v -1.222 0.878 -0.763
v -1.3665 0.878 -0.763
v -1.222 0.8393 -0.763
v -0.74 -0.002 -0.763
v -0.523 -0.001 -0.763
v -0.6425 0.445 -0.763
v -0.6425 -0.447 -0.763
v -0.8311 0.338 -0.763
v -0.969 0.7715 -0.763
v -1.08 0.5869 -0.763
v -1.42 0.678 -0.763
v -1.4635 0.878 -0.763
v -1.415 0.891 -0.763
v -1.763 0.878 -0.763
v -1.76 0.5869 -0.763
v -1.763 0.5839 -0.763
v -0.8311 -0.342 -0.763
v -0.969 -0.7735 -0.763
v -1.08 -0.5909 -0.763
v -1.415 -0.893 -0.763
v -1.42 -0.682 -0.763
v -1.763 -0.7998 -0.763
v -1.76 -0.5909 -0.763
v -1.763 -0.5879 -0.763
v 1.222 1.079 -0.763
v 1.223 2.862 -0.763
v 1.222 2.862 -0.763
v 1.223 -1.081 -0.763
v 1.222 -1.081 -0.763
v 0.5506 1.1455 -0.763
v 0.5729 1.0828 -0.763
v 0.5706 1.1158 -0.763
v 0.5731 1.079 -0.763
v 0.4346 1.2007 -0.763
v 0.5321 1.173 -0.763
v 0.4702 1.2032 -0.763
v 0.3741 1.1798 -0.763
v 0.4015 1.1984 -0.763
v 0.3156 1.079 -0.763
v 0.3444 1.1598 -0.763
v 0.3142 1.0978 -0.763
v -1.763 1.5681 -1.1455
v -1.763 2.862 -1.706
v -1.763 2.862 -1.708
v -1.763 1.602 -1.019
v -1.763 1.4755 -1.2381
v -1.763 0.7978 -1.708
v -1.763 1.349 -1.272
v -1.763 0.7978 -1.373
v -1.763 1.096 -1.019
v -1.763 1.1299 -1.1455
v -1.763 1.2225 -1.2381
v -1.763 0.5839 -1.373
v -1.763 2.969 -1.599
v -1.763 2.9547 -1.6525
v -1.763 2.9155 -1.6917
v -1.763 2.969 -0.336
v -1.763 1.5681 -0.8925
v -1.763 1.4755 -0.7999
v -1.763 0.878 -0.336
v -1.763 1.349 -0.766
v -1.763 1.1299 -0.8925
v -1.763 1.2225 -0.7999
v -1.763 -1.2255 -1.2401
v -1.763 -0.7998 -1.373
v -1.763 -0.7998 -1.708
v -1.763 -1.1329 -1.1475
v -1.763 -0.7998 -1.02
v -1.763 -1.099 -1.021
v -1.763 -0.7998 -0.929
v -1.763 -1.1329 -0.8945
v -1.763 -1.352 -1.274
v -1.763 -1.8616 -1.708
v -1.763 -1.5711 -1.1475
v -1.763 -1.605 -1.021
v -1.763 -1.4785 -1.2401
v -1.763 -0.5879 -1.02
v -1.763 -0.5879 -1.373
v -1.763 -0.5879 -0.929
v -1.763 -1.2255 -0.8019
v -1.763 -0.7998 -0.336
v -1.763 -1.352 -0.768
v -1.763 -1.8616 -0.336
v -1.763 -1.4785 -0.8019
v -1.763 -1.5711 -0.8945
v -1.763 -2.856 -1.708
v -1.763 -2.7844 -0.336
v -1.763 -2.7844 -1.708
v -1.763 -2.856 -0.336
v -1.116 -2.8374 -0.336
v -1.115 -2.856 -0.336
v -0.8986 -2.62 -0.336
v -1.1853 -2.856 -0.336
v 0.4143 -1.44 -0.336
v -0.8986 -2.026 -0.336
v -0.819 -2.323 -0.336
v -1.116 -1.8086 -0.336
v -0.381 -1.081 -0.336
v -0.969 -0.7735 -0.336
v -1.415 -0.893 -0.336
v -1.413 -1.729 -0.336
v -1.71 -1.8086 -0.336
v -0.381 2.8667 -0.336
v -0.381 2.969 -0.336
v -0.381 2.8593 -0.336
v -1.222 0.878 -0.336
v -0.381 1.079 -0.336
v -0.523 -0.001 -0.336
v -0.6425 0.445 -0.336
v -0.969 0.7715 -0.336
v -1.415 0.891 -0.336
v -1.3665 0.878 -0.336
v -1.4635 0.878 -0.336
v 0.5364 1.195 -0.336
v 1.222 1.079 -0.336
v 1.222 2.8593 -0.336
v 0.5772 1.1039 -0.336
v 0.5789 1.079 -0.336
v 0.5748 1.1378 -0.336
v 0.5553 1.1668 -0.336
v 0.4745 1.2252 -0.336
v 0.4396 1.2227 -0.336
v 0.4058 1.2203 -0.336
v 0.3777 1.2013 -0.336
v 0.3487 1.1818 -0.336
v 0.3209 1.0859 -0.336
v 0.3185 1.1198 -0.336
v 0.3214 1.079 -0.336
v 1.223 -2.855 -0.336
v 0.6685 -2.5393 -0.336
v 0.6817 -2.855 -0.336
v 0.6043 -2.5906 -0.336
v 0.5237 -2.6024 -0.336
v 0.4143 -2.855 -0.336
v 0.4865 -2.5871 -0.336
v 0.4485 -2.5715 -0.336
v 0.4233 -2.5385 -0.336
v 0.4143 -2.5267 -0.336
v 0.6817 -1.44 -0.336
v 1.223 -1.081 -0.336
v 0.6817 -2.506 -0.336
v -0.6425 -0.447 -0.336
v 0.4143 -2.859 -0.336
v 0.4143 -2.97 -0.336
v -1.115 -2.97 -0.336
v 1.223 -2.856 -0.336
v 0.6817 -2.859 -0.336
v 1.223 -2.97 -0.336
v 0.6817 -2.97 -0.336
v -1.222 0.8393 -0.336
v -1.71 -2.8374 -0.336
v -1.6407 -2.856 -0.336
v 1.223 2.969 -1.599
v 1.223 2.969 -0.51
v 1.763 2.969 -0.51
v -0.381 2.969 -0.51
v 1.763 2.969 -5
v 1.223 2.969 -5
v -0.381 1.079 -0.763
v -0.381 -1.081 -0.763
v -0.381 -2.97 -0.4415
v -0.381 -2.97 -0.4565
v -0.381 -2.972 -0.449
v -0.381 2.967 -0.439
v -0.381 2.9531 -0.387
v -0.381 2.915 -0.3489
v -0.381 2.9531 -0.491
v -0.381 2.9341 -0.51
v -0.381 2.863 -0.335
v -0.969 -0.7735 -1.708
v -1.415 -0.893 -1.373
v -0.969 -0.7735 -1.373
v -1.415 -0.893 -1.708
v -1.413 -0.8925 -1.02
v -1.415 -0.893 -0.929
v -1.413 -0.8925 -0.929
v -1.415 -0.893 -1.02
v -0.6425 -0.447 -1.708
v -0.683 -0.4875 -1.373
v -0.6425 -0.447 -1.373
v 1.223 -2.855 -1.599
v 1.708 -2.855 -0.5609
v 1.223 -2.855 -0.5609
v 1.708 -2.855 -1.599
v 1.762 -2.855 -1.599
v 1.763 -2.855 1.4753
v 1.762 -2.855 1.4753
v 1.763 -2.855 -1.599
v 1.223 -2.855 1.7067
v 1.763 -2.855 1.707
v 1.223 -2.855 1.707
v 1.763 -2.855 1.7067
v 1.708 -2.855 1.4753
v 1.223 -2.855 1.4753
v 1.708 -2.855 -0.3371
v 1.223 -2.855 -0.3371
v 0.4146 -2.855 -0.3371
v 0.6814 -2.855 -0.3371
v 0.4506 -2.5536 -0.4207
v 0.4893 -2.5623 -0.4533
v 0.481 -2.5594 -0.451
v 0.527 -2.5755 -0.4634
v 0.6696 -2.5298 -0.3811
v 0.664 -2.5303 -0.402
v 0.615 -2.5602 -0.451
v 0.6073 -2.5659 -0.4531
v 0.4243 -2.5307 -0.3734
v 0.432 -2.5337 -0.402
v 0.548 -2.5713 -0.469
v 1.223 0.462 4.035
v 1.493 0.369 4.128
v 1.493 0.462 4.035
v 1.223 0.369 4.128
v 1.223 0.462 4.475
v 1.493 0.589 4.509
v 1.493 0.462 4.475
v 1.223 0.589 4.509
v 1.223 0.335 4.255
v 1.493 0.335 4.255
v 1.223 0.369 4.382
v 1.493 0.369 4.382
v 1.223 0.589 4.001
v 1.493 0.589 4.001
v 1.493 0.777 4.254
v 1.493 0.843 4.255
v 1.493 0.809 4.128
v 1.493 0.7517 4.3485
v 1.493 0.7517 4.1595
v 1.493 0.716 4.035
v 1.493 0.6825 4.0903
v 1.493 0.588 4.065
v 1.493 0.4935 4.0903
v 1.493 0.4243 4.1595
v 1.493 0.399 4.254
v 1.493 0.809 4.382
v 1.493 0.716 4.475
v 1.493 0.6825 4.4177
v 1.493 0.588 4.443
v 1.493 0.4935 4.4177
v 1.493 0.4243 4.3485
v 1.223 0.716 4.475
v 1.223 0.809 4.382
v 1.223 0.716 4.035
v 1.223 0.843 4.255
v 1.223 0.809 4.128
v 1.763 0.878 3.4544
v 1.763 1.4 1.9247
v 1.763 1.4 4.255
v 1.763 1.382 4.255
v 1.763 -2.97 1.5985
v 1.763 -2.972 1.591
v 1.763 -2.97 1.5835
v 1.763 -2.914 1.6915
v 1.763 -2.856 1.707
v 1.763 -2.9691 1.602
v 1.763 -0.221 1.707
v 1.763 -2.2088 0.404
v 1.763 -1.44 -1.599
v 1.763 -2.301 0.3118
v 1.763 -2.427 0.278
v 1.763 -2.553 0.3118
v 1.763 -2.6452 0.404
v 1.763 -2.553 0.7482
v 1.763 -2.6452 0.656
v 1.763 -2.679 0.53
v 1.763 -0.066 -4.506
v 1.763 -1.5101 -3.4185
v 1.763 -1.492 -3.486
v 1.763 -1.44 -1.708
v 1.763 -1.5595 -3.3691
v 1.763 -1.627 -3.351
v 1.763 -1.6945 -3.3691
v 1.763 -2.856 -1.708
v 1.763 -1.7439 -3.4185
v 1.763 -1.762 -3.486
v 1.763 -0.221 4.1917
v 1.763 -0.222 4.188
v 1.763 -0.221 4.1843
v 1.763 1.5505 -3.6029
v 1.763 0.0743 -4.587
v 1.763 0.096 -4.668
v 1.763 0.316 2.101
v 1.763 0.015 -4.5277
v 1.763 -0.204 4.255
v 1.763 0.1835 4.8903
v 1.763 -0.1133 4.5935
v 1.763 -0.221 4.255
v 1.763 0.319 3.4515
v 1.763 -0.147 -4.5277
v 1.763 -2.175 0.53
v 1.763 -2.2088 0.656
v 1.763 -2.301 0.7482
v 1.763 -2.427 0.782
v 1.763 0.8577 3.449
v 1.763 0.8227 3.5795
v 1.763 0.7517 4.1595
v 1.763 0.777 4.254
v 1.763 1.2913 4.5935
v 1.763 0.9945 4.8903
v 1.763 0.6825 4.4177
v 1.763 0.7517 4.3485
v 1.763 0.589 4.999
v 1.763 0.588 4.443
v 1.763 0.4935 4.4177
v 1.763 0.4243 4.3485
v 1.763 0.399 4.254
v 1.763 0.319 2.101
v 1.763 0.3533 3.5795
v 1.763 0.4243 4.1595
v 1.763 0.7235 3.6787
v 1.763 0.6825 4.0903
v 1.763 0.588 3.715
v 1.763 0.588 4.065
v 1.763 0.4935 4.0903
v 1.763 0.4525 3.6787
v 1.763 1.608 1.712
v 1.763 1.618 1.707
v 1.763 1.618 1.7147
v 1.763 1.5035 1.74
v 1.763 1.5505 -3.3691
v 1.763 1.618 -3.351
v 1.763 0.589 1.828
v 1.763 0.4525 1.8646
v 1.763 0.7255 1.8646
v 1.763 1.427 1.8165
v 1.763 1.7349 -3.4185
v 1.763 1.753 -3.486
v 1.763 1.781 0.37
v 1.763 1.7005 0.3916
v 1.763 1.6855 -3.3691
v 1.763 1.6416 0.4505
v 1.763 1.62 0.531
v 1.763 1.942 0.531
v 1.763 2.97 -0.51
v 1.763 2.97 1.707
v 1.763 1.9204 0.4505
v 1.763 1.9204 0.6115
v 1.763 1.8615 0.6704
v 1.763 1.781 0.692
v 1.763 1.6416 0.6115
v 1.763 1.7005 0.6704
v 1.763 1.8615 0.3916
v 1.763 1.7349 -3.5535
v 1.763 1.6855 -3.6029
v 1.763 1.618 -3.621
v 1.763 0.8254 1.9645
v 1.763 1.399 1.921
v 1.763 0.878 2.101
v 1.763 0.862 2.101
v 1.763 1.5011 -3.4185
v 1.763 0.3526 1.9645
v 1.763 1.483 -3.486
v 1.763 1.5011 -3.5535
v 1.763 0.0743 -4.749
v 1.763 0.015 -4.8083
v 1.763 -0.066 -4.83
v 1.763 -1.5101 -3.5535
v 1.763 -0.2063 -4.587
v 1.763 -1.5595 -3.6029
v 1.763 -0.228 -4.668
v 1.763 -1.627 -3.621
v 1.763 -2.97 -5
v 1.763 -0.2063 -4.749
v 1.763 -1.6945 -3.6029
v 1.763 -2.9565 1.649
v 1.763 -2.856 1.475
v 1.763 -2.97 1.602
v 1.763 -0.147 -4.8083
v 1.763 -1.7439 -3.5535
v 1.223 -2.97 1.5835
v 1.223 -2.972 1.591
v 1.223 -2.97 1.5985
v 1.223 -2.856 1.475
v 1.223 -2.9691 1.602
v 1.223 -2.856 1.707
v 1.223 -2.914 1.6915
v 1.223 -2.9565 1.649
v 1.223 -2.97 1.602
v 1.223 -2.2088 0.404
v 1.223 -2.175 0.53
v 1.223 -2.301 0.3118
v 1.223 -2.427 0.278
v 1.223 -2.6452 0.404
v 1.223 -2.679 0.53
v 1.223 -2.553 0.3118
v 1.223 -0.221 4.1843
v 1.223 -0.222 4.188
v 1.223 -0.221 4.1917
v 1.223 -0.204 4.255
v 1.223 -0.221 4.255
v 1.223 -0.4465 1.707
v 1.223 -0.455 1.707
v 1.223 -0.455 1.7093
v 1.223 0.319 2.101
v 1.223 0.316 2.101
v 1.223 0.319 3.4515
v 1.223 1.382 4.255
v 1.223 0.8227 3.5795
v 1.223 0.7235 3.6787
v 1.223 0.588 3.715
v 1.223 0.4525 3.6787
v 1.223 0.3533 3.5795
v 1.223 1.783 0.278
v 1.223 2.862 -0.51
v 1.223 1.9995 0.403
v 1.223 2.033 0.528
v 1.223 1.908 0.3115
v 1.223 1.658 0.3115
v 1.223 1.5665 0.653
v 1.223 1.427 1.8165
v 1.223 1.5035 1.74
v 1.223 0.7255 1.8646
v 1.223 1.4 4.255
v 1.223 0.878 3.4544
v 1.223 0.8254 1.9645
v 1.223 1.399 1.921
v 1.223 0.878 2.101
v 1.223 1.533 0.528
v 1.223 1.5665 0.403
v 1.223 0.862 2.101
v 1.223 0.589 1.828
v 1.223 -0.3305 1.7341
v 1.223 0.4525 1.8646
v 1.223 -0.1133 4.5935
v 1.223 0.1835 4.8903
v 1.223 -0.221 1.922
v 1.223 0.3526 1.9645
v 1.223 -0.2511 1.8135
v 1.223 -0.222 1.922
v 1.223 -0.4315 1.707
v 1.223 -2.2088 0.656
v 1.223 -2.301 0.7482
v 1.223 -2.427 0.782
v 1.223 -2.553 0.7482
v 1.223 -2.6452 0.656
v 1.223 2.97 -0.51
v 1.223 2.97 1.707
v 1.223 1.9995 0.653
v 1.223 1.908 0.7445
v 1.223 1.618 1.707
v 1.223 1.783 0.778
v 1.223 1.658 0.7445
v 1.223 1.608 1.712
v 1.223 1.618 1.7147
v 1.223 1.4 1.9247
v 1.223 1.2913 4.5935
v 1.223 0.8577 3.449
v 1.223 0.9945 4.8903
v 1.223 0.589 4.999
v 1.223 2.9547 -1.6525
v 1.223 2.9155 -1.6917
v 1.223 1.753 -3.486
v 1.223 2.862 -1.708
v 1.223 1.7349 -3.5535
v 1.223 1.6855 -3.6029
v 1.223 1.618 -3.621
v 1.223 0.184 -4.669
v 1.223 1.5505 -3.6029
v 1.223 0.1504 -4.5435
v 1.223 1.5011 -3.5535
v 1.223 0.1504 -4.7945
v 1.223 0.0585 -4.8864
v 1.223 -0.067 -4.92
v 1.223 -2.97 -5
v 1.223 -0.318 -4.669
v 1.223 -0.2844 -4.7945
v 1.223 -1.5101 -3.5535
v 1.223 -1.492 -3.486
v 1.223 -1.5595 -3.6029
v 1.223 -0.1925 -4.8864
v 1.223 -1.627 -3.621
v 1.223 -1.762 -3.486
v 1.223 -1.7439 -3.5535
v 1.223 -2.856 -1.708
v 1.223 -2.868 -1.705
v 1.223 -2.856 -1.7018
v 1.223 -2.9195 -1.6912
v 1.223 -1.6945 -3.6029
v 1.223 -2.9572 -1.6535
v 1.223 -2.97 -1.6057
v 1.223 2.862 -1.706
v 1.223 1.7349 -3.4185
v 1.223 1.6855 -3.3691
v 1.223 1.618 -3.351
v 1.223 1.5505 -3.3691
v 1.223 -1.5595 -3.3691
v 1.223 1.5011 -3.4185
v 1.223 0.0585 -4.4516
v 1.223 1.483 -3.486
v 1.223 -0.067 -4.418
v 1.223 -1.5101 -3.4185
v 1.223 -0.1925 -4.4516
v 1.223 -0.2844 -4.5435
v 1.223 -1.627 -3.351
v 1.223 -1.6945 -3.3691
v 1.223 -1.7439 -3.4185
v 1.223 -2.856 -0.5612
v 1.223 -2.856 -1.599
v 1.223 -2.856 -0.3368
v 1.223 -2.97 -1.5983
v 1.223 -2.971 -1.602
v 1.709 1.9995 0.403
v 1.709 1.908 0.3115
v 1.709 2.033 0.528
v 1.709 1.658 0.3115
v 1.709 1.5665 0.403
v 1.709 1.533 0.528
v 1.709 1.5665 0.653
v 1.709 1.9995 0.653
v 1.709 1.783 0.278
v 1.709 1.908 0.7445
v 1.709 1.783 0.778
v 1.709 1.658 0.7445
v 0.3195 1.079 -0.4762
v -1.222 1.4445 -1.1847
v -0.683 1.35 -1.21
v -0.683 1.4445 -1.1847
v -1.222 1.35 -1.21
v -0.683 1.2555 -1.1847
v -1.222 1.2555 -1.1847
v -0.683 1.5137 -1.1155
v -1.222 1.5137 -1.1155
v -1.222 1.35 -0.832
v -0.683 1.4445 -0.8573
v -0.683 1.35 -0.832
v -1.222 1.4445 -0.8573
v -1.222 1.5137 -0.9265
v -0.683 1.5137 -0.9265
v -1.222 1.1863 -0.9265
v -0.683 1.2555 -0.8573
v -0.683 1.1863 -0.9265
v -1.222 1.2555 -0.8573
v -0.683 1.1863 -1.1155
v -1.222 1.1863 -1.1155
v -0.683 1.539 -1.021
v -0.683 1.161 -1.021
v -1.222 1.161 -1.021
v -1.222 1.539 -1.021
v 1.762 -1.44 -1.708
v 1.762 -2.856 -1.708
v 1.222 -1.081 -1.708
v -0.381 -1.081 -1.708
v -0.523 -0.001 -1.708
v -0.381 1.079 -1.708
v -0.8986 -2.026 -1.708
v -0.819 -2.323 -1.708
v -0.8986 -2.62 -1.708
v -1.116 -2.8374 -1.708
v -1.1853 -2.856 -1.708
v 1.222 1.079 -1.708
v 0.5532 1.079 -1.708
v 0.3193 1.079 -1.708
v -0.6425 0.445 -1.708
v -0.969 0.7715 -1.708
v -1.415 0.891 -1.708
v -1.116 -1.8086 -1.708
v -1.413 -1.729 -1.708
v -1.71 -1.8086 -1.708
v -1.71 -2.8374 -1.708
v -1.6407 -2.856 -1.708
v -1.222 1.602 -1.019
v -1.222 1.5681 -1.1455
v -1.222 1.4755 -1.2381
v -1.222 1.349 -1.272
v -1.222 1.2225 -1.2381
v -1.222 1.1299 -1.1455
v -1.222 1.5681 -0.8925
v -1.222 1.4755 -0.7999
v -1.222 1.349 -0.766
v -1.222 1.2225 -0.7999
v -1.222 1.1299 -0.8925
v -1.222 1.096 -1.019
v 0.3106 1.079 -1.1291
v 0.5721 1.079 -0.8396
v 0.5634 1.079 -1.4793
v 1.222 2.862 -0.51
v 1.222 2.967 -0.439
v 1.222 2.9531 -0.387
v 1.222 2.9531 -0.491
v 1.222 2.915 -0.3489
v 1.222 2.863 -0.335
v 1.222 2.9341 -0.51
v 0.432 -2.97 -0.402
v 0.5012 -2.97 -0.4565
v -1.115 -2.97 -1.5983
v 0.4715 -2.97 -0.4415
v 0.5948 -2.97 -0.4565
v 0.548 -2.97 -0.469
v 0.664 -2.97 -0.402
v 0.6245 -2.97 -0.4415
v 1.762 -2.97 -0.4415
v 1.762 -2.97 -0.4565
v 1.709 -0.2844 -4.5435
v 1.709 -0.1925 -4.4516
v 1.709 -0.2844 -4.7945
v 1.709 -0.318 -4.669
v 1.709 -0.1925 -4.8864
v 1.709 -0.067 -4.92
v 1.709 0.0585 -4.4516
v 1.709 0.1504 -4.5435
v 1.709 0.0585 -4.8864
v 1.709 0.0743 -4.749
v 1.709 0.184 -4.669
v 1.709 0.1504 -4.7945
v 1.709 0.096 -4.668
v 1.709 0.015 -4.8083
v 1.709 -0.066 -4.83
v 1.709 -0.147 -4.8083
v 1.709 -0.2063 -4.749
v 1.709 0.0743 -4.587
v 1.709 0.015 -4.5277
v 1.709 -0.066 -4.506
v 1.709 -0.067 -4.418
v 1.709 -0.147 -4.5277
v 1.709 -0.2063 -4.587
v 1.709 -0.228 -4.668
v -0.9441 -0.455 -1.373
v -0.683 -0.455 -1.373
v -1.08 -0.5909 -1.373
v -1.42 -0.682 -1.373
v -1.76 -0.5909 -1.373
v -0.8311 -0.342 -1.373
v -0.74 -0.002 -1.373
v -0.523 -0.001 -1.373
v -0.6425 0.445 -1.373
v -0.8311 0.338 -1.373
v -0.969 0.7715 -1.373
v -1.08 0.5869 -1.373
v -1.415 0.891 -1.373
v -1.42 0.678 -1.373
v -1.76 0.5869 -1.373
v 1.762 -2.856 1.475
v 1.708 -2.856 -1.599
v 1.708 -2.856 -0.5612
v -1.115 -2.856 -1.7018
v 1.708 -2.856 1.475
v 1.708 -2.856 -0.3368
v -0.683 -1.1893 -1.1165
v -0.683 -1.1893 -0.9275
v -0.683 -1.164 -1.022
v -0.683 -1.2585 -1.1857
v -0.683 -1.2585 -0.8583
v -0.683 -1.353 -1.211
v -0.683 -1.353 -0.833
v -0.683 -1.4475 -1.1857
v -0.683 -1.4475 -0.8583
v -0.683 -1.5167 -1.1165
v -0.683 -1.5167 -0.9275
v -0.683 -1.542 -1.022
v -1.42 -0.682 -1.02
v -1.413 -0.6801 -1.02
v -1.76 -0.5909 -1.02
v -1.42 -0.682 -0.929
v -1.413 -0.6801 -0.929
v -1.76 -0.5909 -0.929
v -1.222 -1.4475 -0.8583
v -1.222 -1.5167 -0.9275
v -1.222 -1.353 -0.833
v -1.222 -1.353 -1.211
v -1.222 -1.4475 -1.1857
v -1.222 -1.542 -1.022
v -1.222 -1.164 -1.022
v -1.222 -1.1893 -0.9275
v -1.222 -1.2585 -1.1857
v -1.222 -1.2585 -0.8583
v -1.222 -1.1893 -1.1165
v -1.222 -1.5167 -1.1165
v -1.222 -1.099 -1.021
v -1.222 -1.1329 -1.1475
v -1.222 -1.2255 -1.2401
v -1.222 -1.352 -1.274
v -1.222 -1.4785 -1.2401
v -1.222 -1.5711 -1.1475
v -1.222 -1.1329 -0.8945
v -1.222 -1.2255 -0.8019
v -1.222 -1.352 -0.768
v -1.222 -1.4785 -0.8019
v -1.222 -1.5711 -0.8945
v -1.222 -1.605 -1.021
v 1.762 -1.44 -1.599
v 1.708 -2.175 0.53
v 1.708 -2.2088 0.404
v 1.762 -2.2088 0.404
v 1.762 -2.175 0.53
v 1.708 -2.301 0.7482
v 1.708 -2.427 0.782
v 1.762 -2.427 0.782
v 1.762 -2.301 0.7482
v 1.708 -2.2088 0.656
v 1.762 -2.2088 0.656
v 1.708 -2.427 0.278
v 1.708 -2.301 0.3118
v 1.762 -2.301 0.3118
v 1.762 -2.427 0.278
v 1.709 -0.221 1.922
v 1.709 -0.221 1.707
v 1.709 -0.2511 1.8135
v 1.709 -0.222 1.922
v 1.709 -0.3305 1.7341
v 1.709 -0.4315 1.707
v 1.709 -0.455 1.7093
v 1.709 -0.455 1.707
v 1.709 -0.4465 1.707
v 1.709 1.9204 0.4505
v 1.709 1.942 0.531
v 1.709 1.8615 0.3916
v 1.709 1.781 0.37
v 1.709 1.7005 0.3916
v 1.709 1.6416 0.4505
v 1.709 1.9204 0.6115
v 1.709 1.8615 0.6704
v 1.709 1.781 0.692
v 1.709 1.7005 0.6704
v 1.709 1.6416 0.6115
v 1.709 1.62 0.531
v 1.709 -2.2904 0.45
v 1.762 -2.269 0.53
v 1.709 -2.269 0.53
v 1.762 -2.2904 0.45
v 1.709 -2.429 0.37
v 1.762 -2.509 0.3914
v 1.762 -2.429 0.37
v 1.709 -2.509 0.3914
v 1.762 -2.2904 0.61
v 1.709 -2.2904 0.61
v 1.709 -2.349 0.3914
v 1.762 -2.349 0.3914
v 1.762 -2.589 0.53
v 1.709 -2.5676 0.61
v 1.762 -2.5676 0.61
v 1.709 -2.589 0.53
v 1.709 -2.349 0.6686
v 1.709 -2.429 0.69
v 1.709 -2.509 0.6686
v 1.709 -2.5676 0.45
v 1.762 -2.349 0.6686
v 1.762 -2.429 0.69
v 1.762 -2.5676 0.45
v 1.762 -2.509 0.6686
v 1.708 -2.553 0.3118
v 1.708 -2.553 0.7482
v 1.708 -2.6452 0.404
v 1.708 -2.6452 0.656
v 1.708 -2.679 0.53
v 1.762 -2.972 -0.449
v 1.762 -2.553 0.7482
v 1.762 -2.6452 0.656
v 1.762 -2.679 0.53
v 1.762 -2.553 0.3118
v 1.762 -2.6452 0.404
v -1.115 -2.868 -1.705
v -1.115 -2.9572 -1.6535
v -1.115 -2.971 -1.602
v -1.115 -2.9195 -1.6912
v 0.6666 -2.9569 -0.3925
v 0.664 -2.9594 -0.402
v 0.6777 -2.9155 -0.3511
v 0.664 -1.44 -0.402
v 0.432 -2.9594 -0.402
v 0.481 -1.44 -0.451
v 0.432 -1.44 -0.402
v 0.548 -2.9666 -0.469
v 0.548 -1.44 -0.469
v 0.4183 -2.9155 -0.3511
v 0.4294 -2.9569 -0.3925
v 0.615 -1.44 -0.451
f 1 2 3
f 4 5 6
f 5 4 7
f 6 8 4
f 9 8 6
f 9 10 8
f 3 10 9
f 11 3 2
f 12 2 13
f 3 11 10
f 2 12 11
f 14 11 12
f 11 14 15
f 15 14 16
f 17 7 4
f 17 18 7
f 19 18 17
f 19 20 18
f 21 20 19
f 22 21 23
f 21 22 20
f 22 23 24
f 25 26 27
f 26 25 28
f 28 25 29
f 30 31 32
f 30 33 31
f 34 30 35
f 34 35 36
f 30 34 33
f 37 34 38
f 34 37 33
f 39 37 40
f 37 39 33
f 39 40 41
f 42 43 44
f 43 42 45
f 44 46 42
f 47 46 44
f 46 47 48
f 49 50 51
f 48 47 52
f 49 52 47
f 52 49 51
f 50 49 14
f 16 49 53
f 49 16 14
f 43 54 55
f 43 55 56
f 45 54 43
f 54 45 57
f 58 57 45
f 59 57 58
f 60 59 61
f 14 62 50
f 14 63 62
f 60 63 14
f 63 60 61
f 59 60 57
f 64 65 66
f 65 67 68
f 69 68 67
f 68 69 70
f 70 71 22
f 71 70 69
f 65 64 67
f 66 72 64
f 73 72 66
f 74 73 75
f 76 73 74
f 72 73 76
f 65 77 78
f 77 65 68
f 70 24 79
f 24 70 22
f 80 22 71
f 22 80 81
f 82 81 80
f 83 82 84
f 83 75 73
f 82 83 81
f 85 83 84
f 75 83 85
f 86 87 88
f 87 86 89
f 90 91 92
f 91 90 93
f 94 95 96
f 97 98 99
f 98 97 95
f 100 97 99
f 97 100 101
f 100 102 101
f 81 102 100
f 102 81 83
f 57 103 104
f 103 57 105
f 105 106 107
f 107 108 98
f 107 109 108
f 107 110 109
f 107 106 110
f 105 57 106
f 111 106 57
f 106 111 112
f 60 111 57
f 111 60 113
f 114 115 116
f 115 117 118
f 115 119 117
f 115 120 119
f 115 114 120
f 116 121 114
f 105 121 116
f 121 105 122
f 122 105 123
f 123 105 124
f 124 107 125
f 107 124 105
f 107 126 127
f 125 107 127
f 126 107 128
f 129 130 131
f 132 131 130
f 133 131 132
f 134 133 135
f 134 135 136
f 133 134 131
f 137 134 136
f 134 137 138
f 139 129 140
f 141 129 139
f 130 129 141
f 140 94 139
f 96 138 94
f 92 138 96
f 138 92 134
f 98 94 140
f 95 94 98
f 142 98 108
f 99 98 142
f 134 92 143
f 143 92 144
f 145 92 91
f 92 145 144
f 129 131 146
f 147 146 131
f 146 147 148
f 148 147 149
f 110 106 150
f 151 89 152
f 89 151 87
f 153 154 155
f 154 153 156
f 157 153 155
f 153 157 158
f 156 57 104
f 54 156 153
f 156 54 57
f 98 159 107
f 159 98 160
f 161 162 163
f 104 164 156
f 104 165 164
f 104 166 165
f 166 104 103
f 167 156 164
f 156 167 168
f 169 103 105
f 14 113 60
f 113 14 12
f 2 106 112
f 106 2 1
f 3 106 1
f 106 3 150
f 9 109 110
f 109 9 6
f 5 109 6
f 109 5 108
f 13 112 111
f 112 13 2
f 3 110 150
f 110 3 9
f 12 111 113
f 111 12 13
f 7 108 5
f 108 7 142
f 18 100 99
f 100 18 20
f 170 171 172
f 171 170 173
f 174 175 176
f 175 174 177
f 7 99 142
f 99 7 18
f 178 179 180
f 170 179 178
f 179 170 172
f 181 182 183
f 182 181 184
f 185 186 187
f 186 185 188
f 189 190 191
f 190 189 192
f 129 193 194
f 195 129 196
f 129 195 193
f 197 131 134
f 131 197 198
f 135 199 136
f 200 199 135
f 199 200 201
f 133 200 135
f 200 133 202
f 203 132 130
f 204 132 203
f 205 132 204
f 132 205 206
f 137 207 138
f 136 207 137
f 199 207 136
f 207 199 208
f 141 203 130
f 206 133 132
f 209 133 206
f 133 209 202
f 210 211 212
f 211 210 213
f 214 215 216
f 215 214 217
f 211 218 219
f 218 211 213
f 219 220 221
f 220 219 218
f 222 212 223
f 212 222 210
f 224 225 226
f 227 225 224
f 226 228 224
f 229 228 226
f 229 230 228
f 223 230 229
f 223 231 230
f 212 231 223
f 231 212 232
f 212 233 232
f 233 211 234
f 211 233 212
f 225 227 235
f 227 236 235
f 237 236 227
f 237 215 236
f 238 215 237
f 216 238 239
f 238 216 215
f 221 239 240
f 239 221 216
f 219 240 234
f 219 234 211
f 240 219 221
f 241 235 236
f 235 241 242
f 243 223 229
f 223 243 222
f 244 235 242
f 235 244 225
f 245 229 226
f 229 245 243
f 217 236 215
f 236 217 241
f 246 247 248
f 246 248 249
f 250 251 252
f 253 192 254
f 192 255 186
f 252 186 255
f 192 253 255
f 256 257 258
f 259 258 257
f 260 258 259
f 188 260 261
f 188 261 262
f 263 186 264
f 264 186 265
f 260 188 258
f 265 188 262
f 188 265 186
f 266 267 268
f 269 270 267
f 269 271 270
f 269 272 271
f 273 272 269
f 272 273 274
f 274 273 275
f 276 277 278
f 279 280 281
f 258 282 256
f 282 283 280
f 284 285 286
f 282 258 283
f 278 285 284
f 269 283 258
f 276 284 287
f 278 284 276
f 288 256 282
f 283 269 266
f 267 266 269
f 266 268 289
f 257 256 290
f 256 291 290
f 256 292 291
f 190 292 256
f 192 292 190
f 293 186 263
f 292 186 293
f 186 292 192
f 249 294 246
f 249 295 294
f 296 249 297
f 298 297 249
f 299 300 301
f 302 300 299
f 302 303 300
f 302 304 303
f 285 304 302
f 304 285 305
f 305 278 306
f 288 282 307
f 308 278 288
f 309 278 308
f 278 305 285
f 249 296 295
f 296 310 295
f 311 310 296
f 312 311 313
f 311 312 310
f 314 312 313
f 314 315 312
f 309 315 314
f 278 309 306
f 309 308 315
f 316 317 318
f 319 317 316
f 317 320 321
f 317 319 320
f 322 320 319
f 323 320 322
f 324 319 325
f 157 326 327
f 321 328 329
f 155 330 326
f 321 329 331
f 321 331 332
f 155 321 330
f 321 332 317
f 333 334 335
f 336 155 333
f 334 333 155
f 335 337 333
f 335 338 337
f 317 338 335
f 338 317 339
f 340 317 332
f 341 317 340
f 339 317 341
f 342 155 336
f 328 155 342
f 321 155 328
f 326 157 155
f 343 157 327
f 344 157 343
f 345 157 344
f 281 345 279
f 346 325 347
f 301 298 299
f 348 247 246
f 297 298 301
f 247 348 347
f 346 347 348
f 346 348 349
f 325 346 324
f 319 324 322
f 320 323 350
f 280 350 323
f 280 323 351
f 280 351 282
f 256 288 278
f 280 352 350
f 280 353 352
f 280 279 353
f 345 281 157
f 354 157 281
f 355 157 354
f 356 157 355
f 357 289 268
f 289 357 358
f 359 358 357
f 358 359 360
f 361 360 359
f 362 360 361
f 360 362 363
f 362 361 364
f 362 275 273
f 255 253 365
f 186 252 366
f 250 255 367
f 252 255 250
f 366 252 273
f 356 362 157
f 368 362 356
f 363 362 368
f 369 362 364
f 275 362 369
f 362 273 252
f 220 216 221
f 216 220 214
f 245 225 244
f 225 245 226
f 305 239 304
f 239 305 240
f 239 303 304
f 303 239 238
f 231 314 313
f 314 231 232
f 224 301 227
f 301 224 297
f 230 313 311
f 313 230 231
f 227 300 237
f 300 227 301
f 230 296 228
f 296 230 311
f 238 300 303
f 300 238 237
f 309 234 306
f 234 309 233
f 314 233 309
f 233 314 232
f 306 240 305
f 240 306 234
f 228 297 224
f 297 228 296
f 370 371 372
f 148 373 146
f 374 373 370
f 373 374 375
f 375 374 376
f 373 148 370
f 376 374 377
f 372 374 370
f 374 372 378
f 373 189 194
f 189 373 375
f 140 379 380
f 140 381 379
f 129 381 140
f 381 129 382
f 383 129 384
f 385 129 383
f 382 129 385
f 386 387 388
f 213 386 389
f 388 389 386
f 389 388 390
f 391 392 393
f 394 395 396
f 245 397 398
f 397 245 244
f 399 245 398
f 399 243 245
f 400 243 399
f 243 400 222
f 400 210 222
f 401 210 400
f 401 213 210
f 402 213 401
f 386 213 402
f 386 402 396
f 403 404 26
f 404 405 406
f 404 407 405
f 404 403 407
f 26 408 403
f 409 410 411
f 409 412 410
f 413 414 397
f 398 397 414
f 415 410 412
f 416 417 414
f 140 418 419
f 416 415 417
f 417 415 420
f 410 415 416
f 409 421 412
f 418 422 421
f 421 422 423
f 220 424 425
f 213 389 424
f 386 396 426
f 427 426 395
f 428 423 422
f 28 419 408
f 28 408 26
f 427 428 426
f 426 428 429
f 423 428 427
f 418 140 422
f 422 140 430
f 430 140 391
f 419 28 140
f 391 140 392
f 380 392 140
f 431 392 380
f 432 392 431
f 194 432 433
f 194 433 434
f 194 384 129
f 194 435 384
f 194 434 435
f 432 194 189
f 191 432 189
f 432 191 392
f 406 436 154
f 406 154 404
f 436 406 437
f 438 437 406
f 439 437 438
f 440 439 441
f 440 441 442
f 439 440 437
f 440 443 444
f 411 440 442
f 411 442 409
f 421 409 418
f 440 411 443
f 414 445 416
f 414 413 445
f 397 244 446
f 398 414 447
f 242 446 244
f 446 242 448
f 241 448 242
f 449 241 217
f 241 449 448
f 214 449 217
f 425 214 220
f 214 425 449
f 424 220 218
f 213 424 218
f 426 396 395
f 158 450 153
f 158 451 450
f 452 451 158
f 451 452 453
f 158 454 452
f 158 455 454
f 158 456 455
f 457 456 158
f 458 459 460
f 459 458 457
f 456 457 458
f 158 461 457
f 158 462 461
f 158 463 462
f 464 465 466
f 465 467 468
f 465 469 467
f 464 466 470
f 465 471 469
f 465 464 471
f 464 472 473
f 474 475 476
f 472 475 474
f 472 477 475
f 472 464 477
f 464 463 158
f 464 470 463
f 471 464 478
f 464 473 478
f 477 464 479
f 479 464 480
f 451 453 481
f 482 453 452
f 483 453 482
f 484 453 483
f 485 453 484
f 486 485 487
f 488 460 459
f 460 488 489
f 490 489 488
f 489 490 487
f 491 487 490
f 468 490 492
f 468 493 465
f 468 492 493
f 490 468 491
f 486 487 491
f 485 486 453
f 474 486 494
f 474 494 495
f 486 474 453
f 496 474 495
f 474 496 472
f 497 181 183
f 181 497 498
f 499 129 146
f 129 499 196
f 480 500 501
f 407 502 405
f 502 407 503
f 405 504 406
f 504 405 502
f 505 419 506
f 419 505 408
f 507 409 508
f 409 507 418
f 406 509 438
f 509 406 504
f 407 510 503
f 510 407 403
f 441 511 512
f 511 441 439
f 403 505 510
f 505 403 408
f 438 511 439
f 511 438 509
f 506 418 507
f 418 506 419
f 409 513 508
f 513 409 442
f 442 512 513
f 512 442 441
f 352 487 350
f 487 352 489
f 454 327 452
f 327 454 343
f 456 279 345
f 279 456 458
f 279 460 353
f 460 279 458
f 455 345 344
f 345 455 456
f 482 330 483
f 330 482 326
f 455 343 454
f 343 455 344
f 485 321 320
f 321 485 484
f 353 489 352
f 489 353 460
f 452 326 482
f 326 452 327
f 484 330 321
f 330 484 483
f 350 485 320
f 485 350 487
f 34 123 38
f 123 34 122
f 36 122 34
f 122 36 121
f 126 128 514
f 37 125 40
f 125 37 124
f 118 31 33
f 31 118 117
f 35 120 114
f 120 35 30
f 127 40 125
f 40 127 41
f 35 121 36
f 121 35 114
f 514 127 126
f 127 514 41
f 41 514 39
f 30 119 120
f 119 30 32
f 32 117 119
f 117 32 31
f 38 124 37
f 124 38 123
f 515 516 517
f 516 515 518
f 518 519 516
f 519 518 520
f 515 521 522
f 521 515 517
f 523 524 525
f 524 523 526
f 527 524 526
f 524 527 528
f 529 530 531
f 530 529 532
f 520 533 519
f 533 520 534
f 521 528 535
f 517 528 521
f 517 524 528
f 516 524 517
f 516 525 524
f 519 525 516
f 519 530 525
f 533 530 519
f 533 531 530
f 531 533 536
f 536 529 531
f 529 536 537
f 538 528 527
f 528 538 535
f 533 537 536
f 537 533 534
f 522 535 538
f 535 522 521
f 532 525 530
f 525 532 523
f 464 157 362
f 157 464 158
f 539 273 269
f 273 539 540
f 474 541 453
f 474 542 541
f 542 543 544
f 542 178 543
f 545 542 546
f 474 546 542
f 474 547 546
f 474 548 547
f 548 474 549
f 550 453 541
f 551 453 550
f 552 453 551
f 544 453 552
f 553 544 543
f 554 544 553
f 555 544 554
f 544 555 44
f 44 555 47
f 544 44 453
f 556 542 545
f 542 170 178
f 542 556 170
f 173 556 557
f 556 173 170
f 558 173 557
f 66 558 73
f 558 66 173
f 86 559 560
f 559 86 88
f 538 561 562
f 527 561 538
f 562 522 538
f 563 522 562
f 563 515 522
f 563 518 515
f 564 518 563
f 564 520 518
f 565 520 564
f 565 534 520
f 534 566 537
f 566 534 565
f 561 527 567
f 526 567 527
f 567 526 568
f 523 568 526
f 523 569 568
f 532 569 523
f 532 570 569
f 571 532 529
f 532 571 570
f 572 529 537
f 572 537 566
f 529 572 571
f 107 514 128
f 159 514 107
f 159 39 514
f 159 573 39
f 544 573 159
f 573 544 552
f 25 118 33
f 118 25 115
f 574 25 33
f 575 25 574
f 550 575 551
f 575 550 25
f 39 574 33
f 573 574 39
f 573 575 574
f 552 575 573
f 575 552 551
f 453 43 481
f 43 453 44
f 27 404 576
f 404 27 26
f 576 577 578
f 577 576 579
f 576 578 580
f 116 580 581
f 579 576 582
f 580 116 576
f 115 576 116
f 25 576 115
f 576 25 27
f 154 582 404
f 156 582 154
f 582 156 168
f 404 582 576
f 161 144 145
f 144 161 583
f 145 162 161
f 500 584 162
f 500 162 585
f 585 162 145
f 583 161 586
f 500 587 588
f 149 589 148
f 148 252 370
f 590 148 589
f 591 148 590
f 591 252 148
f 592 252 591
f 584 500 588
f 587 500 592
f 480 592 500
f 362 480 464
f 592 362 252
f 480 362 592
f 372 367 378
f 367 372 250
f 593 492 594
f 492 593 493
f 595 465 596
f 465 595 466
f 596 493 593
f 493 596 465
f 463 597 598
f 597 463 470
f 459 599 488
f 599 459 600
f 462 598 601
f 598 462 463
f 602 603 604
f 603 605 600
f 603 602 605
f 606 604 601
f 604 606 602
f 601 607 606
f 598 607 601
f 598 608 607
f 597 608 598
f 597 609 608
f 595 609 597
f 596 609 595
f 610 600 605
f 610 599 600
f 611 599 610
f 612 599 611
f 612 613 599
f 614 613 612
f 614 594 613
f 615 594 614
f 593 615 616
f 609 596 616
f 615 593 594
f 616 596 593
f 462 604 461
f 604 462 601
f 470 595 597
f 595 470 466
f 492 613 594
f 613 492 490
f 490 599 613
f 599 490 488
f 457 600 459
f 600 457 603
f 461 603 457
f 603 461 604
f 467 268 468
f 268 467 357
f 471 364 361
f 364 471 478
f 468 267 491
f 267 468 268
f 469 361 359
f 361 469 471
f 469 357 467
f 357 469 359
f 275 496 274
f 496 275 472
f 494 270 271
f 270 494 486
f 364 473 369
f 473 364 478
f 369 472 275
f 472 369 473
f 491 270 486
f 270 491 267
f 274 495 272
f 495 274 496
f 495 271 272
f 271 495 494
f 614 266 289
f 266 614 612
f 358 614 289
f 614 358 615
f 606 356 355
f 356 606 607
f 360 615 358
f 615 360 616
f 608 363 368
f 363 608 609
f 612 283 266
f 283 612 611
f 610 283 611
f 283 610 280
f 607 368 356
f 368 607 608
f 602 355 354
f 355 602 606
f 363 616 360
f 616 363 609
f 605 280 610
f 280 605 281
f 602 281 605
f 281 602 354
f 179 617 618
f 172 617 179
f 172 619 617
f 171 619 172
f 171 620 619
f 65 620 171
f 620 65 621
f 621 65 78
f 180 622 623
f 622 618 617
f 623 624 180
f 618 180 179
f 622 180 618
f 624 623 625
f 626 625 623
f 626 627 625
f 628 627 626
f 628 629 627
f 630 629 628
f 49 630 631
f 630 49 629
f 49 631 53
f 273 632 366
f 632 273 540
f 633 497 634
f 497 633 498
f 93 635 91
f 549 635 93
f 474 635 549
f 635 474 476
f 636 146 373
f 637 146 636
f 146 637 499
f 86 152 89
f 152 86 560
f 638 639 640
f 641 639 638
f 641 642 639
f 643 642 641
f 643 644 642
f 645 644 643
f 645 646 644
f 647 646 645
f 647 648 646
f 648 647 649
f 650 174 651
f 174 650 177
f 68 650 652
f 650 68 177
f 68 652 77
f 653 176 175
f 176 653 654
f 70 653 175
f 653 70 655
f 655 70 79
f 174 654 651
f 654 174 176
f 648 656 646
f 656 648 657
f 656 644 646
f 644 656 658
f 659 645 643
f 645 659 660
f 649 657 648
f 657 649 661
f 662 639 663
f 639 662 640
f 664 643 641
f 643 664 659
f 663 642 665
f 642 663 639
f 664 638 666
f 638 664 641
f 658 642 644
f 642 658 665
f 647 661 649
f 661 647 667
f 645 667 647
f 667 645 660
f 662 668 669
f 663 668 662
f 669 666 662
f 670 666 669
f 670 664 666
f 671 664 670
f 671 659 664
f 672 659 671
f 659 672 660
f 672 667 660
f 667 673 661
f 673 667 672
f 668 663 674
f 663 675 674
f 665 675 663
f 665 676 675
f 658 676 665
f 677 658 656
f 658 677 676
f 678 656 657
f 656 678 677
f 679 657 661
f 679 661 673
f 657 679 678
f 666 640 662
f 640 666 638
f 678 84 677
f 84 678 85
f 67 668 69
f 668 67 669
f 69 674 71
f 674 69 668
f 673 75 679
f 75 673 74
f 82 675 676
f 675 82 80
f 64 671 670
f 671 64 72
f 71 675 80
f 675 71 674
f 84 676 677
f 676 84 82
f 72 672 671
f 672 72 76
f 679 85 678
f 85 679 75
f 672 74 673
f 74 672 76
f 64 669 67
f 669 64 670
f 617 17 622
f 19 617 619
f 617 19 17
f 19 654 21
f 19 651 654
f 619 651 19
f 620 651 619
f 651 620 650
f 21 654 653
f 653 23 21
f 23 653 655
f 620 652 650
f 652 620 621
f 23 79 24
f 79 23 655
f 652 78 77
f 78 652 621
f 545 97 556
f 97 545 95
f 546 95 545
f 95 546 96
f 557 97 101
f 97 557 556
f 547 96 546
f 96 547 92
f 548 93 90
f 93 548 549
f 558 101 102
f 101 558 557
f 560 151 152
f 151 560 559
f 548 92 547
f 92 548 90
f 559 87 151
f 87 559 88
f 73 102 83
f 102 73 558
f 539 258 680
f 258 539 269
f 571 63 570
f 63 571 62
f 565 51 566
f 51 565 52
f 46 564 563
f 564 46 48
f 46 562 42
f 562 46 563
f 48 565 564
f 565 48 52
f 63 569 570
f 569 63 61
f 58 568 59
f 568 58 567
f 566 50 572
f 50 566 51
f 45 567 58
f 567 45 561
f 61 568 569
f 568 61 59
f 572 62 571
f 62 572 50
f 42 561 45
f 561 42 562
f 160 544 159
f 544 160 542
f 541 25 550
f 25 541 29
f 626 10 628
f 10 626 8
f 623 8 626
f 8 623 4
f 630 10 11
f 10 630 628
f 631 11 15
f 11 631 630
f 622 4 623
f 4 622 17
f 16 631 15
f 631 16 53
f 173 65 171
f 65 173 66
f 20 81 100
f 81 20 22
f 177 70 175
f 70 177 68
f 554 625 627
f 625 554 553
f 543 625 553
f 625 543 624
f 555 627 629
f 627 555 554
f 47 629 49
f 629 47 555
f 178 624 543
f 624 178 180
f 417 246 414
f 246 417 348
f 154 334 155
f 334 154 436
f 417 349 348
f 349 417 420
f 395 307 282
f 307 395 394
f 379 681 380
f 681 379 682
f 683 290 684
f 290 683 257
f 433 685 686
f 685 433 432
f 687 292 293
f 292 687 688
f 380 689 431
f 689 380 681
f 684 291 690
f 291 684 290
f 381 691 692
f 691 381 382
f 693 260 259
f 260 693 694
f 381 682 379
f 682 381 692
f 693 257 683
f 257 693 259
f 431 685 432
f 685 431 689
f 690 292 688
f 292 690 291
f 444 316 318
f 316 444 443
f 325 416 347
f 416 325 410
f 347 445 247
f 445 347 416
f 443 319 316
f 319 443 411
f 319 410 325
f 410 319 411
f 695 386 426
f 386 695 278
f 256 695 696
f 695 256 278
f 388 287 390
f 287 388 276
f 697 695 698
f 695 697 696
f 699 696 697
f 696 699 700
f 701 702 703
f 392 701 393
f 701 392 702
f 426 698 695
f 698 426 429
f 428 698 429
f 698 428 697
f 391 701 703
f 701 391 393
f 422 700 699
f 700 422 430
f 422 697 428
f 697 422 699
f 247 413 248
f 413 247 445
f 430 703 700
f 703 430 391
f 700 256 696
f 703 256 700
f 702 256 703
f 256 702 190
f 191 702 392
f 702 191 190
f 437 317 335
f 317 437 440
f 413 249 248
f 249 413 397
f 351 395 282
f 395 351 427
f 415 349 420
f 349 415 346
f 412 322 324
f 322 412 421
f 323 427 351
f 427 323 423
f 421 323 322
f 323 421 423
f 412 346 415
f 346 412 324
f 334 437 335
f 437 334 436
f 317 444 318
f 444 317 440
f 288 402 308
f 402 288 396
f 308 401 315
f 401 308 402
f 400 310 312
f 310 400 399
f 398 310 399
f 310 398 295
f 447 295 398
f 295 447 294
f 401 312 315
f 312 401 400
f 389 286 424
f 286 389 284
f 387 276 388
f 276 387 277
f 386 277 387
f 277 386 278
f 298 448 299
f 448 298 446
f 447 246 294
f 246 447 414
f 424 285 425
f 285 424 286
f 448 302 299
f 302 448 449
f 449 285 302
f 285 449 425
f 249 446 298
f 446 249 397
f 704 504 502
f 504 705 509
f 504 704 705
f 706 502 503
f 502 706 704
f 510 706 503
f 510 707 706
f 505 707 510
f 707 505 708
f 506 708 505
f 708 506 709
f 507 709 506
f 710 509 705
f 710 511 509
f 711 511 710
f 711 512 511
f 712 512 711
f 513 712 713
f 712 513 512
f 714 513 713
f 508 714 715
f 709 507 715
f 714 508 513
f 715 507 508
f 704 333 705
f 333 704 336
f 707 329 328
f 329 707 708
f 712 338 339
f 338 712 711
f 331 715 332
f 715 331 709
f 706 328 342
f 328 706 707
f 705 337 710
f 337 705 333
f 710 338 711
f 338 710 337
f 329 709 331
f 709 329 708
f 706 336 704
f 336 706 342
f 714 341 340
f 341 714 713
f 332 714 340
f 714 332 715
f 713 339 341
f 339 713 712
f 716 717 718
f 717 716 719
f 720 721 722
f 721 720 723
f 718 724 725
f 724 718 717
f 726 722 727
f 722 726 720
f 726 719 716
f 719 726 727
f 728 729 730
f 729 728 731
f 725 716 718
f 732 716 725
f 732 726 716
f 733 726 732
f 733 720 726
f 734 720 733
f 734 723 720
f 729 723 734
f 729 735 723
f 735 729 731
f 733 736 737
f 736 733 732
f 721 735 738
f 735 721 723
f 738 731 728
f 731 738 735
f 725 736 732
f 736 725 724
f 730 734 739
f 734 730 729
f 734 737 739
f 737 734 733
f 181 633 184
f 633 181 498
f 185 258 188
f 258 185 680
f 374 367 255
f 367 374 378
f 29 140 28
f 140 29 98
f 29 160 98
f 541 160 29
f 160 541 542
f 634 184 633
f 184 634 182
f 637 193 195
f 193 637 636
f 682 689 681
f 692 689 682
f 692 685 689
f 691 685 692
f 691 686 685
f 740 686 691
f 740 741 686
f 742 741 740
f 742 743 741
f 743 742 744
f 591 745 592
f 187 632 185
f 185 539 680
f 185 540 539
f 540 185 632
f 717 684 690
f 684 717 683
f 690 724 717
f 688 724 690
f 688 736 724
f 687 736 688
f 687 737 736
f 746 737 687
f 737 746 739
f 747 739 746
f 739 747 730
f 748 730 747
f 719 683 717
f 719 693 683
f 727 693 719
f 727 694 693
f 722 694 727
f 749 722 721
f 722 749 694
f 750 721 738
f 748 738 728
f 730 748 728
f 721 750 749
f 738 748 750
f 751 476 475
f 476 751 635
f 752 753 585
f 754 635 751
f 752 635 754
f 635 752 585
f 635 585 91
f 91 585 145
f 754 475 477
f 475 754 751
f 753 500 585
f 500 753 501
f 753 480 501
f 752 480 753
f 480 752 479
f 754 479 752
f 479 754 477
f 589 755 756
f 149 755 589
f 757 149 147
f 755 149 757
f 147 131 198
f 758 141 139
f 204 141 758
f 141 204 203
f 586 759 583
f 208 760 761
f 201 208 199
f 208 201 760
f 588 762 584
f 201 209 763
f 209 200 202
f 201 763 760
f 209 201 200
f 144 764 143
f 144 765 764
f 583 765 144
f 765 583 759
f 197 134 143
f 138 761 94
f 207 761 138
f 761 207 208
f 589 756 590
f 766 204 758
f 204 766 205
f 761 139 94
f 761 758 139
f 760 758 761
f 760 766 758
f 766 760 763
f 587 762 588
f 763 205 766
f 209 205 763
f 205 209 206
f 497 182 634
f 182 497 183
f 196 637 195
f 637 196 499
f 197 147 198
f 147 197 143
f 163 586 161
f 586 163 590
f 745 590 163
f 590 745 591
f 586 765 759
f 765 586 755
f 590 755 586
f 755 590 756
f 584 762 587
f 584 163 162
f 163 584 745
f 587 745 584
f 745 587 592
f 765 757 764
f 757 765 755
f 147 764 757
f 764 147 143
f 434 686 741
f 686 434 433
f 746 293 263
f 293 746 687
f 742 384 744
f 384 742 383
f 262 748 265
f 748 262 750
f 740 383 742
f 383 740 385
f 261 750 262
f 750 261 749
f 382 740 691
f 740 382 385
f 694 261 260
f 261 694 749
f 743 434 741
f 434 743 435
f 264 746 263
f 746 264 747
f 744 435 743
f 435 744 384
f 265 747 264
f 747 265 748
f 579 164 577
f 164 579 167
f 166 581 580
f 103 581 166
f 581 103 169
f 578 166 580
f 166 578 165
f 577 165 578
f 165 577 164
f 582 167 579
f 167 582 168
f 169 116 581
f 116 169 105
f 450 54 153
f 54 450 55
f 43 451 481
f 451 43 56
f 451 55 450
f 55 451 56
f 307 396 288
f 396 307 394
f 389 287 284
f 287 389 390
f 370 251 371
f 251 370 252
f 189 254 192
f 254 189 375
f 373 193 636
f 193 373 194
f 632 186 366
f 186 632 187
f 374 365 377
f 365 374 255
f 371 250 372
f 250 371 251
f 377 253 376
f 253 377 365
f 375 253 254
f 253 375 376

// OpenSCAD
intersection() {
translate([-2.116, -3.565, -6]) cube(size = [4.231, 7.129, 12], center = false);
union() {
difference() {
difference() {
rotate([-180, 0, 0])
translate([-1.763, -2.969, 0.336]) cube(size = [1.382, 4.41, 0.427], center = false);
rotate([-180, 0, 0])
translate([-18.1, -0.878, -1.602]) cube(size = [16.878, 18.978, 3.201], center = false);
}
translate([-1.415, -0.001, -1.708])
cylinder(h = 19.808, r1 = 0.892, r2 = 0.892, center = false, $fn = 12);
}
difference() {
rotate([-180, 0, 0])
translate([-0.381, 2.405, 0.336]) cube(size = [2.089, 0.45, 1.263], center = false);
rotate([180, 12, -97])
translate([2.377, -0.837, -18.1])
cylinder(h = 36.2, r1 = 0.157, r2 = 0.157, center = false, $fn = 12);
}
difference() {
rotate([180, 90, 180])
translate([-4.255, 0.589, 1.493])
cylinder(h = 0.27, r1 = 0.254, r2 = 0.254, center = false, $fn = 12);
rotate([180, 90, 180])
translate([-4.254, 0.588, 1.493])
cylinder(h = 0.27, r1 = 0.189, r2 = 0.189, center = false, $fn = 12);
}
difference() {
rotate([-180, 0, 0])
translate([1.223, -2.969, -1.602]) cube(size = [0.54, 1.89, 1.939], center = false);
rotate([180, 90, 180])
translate([-0.528, 1.783, -18.1])
cylinder(h = 19.863, r1 = 0.25, r2 = 0.25, center = false, $fn = 12);
}
intersection() {
difference() {
difference() {
rotate([-180, 0, 0])
translate([-18.1, -18.1, 0.336]) cube(size = [36.2, 36.2, 17.764], center = false);
rotate([180, 90, 180])
translate([3.486, 1.618, 1.223])
cylinder(h = 16.877, r1 = 0.135, r2 = 0.135, center = false, $fn = 12);
}
union() {
rotate([0, 3, 79])
translate([1.176, -0.232, -18.1])
cylinder(h = 36.2, r1 = 0.133, r2 = 0.133, center = false, $fn = 12);
rotate([180, 90, 180])
translate([1.021, 1.35, -18.1])
cylinder(h = 17.417, r1 = 0.189, r2 = 0.189, center = false, $fn = 12);
}
}
union() {
rotate([-180, 0, 0])
translate([1.223, -2.969, -1.602]) cube(size = [0.54, 2.092, 6.602], center = false);
rotate([-180, 0, 0])
translate([-1.222, -2.862, -18.1]) cube(size = [2.444, 1.783, 19.808], center = false);
rotate([-180, 0, 0])
translate([-1.763, -2.969, 0.51]) cube(size = [3.526, 0.107, 1.089], center = false);
}
}
rotate([-180, 90, 180])
translate([0.439, 2.863, -0.381])
cylinder(h = 1.603, r1 = 0.104, r2 = 0.104, center = false, $fn = 12);
difference() {
difference() {
difference() {
difference() {
rotate([-180, 0, 0])
translate([1.223, -18.1, 1.708]) cube(size = [0.54, 21.07, 3.292], center = false);
rotate([180, 90, 180])
translate([3.486, 1.618, -18.1])
cylinder(h = 36.2, r1 = 0.135, r2 = 0.135, center = false, $fn = 12);
}
union() {
rotate([180, 90, 180])
translate([4.669, -0.067, -18.1])
cylinder(h = 19.809, r1 = 0.251, r2 = 0.251, center = false, $fn = 12);
rotate([180, 90, 180])
translate([3.486, -1.627, -18.1])
cylinder(h = 36.2, r1 = 0.135, r2 = 0.135, center = false, $fn = 12);
}
}
rotate([180, 90, 180])
translate([4.668, -0.066, 1.709])
cylinder(h = 16.391, r1 = 0.162, r2 = 0.162, center = false, $fn = 12);
}
rotate([-180, 0, 0])
translate([-18.1, -18.1, -18.1]) cube(size = [36.2, 15.238, 36.2], center = false);
}
rotate([0, 90, 0])
translate([1.599, 2.862, -1.763])
cylinder(h = 2.986, r1 = 0.107, r2 = 0.107, center = false, $fn = 12);
difference() {
difference() {
difference() {
rotate([-180, 0, 0])
translate([-1.763, 0.455, 0.763]) cube(size = [1.08, 2.401, 0.61], center = false);
rotate([-180, 0, 0])
translate([-1.763, 0.455, 0.929]) cube(size = [0.35, 0.626, 0.091], center = false);
}
union() {
rotate([180, 90, 180])
translate([1.022, -1.353, -1.222])
cylinder(h = 19.322, r1 = 0.189, r2 = 0.189, center = false, $fn = 12);
rotate([180, 90, 180])
translate([1.021, -1.352, -1.763])
cylinder(h = 0.541, r1 = 0.253, r2 = 0.253, center = false, $fn = 12);
translate([-1.42, -0.002, -1.599])
cylinder(h = 0.836, r1 = 0.68, r2 = 0.68, center = false, $fn = 12);
}
}
translate([-1.413, -2.323, -1.373])
cylinder(h = 0.61, r1 = 0.594, r2 = 0.594, center = false, $fn = 12);
}
rotate([-90, 0, 0])
translate([1.223, -4.255, -0.221]) cube(size = [0.54, 2.154, 0.54], center = false);
difference() {
rotate([-180, 0, 0])
translate([-1.763, -2.862, 0.763]) cube(size = [3.526, 4.302, 0.945], center = false);
union() {
difference() {
rotate([-180, 0, 0])
translate([-1.763, 0.455, -1.602]) cube(size = [1.08, 0.985, 2.975], center = false);
translate([-1.415, -0.001, -1.599])
cylinder(h = 0.836, r1 = 0.892, r2 = 0.892, center = false, $fn = 12);
}
rotate([180, 90, 180])
translate([1.019, 1.349, -18.1])
cylinder(h = 17.417, r1 = 0.253, r2 = 0.253, center = false, $fn = 12);
difference() {
rotate([-180, 0, 0])
translate([-1.763, 0.455, -18.1]) cube(size = [0.541, 17.645, 23.1], center = false);
rotate([-180, 0, 0])
translate([-18.1, -18.1, 1.599]) cube(size = [16.878, 19.54, 16.501], center = false);
}
rotate([-180, 0, 0])
translate([-0.381, -1.079, 0.51]) cube(size = [1.603, 19.179, 4.49], center = false);
translate([-1.42, -0.002, -18.1])
cylinder(h = 17.337, r1 = 0.68, r2 = 0.68, center = false, $fn = 12);
translate([-1.415, -0.001, -1.708])
cylinder(h = 0.335, r1 = 0.892, r2 = 0.892, center = false, $fn = 12);
}
}
intersection() {
difference() {
union() {
difference() {
rotate([-90, 0, 0])
translate([1.223, -18.1, 0.878]) cube(size = [0.54, 36.2, 17.222], center = false);
rotate([180, 90, 180])
translate([-0.528, 1.783, -18.1])
cylinder(h = 36.2, r1 = 0.25, r2 = 0.25, center = false, $fn = 12);
}
difference() {
rotate([-90, 0, 0])
translate([1.223, -2.101, -2.405]) cube(size = [0.54, 2.611, 3.805], center = false);
rotate([180, 90, 180])
translate([-0.53, -2.427, 1.223])
cylinder(h = 16.877, r1 = 0.252, r2 = 0.252, center = false, $fn = 12);
}
}
rotate([180, 90, -180])
translate([-1.921, 1.608, -18.1])
cylinder(h = 19.863, r1 = 0.209, r2 = 0.209, center = false, $fn = 12);
}
union() {
difference() {
rotate([-90, 0, 0])
translate([1.223, -1.922, -0.455]) cube(size = [0.486, 2.432, 0.234], center = false);
rotate([180, 90, 180])
translate([-1.922, -0.439, 1.223])
cylinder(h = 0.54, r1 = 0.217, r2 = 0.217, center = false, $fn = 12);
}
rotate([-90, 0, 0])
translate([-18.1, -1.707, -2.405]) cube(size = [19.863, 2.217, 5.375], center = false);
rotate([-90, 0, 0])
translate([-18.1, -1.922, 0.878]) cube(size = [19.863, 0.215, 0.74], center = false);
difference() {
rotate([-90, 0, 0])
translate([1.223, -4.255, -0.221]) cube(size = [0.54, 2.548, 1.621], center = false);
rotate([180, 90, 180])
translate([-2.101, 0.589, 1.223])
cylinder(h = 0.54, r1 = 0.273, r2 = 0.273, center = false, $fn = 12);
}
}
}
intersection() {
rotate([180, 90, 180])
translate([3.486, -1.627, 1.709])
cylinder(h = 0.054, r1 = 0.135, r2 = 0.135, center = false, $fn = 12);
rotate([180, 90, 180])
translate([3.486, -1.627, -18.1])
cylinder(h = 19.323, r1 = 0.135, r2 = 0.135, center = false, $fn = 12);
}
difference() {
rotate([180, 90, 180])
translate([-4.188, 0.589, 1.223])
cylinder(h = 0.54, r1 = 0.811, r2 = 0.811, center = false, $fn = 12);
union() {
rotate([180, 90, 180])
translate([-3.444, 0.588, 1.223])
cylinder(h = 0.54, r1 = 0.271, r2 = 0.271, center = false, $fn = 12);
rotate([180, 90, 180])
translate([-4.255, 0.589, -18.1])
cylinder(h = 19.863, r1 = 0.254, r2 = 0.254, center = false, $fn = 12);
}
}
rotate([-180, 0, 0])
translate([1.223, 2.856, -1.602]) cube(size = [0.54, 0.114, 3.31], center = false);
difference() {
rotate([180, 90, 180])
translate([-0.528, 1.783, 1.709])
cylinder(h = 0.054, r1 = 0.25, r2 = 0.25, center = false, $fn = 12);
rotate([180, 90, 180])
translate([-0.531, 1.781, 1.223])
cylinder(h = 0.54, r1 = 0.161, r2 = 0.161, center = false, $fn = 12);
}
rotate([0, 90, 0])
translate([-1.591, -2.856, 1.223])
cylinder(h = 0.54, r1 = 0.116, r2 = 0.116, center = false, $fn = 12);
difference() {
rotate([-180, 0, 0])
translate([-0.381, 1.081, -1.602]) cube(size = [2.143, 1.775, 3.31], center = false);
union() {
rotate([180, 90, 180])
translate([-0.53, -2.429, 1.709])
cylinder(h = 0.054, r1 = 0.16, r2 = 0.16, center = false, $fn = 12);
rotate([-180, 0, 0])
translate([-0.381, 1.081, -1.602]) cube(size = [2.089, 1.775, 3.201], center = false);
}
}
difference() {
union() {
rotate([0, 90, 0])
translate([1.602, -2.868, -1.115])
cylinder(h = 2.338, r1 = 0.103, r2 = 0.103, center = false, $fn = 12);
rotate([-180, 0, 0])
translate([-1.115, 2.856, 0.336]) cube(size = [2.338, 0.114, 1.263], center = false);
rotate([-180, 0, 0])
translate([-1.115, 1.081, 0.336]) cube(size = [2.338, 1.775, 1.372], center = false);
rotate([-180, 0, 0])
translate([-1.763, 0.455, 0.336]) cube(size = [1.08, 2.401, 1.372], center = false);
}
union() {
translate([-1.413, -2.323, -1.708])
cylinder(h = 19.808, r1 = 0.594, r2 = 0.594, center = false, $fn = 12);
rotate([180, 90, -90])
translate([0.335, -0.548, -2.97])
cylinder(h = 1.53, r1 = 0.134, r2 = 0.134, center = false, $fn = 12);
rotate([-180, 0, 0])
translate([-1.763, 1.081, 0.763]) cube(size = [1.08, 1.775, 0.61], center = false);
translate([-1.415, -0.001, -1.708])
cylinder(h = 19.808, r1 = 0.892, r2 = 0.892, center = false, $fn = 12);
}
}
difference() {
rotate([-180, 0, 0])
translate([-0.381, 1.081, 0.336]) cube(size = [1.603, 1.889, 1.263], center = false);
rotate([180, 90, -90])
translate([0.335, -0.548, -18.1])
cylinder(h = 18.978, r1 = 0.134, r2 = 0.134, center = false, $fn = 12);
}
difference() {
union() {
rotate([-180, 0, 0])
translate([1.223, -0.878, -1.707]) cube(size = [0.54, 3.733, 3.306], center = false);
rotate([-180, 90, 180])
translate([0.449, -2.859, -0.381])
cylinder(h = 2.143, r1 = 0.113, r2 = 0.113, center = false, $fn = 12);
}
rotate([180, 90, 180])
translate([-0.53, -2.427, 1.223])
cylinder(h = 16.877, r1 = 0.252, r2 = 0.252, center = false, $fn = 12);
}
}
}
